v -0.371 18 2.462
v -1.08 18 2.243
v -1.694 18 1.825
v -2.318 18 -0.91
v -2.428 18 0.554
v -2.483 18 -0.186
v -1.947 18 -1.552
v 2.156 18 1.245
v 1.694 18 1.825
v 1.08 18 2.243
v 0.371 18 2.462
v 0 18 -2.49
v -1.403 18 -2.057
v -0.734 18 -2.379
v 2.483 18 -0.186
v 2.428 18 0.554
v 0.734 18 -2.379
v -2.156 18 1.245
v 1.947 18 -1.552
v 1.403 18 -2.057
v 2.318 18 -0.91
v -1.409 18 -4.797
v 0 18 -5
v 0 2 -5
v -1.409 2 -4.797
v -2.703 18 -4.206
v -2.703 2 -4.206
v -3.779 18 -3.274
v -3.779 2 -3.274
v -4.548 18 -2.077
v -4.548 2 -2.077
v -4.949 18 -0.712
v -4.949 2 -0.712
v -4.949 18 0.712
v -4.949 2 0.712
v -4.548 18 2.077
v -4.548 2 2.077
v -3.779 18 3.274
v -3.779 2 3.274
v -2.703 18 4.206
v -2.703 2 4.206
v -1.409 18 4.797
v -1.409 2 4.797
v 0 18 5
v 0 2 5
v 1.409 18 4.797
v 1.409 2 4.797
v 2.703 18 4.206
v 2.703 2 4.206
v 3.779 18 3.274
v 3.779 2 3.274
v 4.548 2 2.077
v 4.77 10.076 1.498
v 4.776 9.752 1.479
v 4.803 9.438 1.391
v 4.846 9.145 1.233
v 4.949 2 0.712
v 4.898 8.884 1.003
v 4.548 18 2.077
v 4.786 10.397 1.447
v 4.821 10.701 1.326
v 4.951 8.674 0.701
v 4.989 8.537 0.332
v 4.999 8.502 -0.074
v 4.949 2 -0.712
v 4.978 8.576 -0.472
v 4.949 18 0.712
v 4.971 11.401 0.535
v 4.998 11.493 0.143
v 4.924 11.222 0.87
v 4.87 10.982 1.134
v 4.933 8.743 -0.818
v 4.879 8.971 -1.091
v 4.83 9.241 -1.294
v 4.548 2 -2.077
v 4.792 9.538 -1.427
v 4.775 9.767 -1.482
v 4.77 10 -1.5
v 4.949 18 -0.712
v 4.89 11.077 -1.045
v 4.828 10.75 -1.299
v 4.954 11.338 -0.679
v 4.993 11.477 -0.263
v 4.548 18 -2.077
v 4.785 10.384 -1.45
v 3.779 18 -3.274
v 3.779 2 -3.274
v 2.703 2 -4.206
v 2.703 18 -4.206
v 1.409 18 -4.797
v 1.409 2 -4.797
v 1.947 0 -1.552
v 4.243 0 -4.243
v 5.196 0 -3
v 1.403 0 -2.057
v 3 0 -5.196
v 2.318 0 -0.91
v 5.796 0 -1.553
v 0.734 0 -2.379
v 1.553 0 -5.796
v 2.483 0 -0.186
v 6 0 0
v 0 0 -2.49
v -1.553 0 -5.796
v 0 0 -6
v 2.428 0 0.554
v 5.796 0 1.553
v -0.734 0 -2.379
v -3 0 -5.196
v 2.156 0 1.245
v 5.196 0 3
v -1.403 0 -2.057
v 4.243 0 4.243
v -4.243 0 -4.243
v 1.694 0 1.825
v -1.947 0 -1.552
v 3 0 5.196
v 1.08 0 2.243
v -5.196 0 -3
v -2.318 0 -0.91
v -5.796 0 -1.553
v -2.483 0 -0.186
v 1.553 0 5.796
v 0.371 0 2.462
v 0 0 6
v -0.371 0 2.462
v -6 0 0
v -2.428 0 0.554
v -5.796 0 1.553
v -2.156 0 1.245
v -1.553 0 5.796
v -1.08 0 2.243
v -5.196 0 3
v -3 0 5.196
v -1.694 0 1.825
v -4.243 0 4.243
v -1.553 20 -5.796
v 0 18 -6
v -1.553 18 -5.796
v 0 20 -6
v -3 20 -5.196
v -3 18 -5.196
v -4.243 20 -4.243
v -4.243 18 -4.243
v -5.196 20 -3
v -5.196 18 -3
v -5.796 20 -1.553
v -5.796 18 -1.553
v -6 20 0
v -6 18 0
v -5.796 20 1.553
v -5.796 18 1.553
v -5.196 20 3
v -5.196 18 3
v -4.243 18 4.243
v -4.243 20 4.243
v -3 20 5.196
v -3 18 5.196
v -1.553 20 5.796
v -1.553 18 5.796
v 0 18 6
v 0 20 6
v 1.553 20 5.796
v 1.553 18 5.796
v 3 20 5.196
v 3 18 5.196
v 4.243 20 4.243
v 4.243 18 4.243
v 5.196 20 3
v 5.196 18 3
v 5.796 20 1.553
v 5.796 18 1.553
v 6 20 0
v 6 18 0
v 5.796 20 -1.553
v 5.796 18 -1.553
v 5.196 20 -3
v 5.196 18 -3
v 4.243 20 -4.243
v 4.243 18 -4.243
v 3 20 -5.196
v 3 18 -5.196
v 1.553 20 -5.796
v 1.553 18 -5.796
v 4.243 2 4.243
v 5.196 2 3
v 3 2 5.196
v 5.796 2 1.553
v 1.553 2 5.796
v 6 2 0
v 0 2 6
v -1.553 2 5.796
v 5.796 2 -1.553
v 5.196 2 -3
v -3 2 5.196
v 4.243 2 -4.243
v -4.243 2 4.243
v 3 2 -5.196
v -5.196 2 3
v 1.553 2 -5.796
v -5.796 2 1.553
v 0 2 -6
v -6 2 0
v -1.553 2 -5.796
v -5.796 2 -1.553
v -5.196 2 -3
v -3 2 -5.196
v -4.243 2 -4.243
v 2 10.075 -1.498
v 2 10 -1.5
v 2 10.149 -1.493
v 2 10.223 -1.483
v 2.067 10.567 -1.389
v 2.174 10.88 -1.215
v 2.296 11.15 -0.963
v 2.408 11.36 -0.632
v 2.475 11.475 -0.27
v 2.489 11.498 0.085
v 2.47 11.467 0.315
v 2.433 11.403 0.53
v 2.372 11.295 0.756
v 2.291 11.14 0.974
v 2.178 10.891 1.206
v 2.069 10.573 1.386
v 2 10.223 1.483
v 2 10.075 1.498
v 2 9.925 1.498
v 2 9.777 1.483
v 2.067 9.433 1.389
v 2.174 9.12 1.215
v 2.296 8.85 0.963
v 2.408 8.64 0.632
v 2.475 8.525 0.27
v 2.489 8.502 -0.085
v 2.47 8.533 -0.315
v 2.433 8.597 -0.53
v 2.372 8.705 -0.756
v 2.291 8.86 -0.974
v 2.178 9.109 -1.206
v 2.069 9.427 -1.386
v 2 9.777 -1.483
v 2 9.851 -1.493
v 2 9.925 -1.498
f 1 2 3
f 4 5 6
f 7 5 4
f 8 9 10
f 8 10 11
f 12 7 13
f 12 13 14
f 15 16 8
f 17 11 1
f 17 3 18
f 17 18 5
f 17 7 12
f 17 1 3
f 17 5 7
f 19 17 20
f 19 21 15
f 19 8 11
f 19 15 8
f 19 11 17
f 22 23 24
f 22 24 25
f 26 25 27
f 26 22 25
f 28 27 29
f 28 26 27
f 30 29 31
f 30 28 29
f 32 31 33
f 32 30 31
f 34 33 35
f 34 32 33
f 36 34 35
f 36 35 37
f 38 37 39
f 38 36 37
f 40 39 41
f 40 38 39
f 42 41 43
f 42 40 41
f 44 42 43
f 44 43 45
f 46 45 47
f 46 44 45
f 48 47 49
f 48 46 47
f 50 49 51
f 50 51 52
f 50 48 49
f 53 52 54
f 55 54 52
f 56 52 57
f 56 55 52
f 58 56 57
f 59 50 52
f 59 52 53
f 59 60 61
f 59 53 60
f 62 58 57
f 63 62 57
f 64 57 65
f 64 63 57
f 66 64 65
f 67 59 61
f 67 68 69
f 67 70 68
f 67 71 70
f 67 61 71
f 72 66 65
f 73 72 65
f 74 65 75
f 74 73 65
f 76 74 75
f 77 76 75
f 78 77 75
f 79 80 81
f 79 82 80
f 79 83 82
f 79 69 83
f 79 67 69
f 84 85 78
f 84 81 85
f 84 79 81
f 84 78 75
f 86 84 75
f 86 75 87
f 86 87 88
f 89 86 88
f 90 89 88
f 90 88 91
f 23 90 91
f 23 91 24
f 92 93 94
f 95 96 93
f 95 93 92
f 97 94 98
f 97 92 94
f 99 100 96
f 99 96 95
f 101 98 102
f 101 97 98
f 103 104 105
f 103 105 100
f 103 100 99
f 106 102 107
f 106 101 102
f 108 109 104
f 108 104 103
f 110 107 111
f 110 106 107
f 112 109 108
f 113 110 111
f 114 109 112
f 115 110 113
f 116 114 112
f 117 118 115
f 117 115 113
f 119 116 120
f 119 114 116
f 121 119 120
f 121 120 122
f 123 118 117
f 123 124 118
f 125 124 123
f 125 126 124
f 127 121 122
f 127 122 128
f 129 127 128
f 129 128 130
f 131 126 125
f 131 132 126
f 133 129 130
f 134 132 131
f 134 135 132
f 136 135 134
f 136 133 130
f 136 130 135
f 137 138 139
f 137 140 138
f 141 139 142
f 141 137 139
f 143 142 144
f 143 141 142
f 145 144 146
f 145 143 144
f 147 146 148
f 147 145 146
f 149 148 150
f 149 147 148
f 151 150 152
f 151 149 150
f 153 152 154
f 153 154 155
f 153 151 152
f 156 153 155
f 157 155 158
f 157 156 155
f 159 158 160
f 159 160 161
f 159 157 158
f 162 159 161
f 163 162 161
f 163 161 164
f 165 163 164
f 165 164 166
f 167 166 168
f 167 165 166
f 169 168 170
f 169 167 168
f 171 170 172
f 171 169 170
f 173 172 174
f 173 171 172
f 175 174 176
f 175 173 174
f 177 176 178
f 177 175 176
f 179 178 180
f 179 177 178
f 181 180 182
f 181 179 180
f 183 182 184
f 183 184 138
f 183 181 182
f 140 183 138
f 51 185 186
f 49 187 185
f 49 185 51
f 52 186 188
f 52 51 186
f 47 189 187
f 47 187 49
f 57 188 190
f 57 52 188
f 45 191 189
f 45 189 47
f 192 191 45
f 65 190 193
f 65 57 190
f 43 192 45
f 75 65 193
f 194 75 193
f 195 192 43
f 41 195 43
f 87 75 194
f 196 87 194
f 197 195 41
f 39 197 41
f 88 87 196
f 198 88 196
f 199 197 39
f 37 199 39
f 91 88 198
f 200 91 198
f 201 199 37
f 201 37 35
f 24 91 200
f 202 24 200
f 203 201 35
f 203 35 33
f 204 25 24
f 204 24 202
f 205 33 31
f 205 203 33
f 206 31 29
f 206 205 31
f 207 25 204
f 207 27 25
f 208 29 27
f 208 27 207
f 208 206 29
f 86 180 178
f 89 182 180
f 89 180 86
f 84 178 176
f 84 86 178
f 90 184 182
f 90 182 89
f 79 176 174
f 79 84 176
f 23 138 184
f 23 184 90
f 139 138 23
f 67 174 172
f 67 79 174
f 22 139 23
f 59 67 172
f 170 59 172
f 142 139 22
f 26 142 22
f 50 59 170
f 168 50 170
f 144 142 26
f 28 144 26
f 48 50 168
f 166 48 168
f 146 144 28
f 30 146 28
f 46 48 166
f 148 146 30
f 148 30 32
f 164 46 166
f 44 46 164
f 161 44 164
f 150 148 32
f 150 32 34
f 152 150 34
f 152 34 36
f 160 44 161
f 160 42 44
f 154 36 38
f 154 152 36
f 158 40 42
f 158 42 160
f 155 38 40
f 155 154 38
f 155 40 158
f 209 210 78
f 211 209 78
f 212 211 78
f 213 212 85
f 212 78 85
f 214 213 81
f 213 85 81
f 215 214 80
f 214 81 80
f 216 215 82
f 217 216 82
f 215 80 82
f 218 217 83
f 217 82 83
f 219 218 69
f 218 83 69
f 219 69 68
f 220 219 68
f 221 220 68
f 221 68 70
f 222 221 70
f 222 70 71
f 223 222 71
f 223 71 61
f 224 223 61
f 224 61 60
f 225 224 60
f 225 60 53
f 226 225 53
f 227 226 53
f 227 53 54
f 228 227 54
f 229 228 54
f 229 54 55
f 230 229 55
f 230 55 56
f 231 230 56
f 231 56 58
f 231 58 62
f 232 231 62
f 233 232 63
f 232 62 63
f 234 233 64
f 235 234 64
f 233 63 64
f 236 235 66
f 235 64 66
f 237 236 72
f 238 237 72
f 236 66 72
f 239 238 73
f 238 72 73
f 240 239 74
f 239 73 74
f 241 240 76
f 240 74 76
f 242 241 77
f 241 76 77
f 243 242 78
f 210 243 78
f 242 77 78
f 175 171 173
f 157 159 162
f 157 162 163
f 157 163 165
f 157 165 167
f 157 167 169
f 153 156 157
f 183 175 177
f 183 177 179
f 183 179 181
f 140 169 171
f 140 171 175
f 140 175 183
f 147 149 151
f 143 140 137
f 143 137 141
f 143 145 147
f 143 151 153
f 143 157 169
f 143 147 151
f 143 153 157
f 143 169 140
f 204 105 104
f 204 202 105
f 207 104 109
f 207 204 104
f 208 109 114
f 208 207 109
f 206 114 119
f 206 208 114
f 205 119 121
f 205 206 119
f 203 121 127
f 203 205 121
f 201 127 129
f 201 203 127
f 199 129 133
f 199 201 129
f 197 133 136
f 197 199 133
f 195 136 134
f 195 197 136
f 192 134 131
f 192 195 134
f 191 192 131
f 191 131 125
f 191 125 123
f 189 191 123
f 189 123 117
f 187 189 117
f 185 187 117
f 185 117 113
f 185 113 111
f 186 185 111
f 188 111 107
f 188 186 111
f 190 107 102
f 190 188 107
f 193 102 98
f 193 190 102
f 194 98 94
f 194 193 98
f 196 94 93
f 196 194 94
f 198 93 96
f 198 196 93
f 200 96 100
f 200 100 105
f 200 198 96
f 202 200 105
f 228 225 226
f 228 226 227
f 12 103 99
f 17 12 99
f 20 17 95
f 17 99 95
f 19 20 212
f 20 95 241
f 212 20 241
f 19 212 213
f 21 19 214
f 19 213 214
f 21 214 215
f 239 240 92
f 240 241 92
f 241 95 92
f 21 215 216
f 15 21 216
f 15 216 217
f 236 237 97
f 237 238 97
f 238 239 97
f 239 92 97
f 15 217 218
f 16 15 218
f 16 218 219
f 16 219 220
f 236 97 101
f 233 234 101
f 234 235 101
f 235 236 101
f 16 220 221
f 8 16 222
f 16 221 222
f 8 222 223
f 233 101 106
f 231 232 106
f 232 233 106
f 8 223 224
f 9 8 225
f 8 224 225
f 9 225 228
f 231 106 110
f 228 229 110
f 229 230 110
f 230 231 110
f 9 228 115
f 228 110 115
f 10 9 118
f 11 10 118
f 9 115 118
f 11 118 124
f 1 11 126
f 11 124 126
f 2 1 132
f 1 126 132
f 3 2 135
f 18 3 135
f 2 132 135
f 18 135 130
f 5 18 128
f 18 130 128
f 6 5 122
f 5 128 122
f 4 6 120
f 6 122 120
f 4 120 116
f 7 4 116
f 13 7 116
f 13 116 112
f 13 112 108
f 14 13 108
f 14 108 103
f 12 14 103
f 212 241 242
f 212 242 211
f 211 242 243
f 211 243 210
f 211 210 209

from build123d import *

# Parameters (mm, degrees)
CROQUIS3_R            = 2.49
CORTAR_EXTRUIR1_DEPTH = 18
CROQUIS4_R            = 1.5
CORTAR_EXTRUIR2_DEPTH = 3


with BuildPart() as part:
    # Croquis2 → Revolución1 (revolve)
    with BuildSketch(Plane.XY, mode=Mode.PRIVATE) as revoluci_n1_sk:
        Polygon((0, 0), (-6, 0), (-6, 2), (-5, 2), (-5, 18), (-6, 18), (-6, 20), (0, 20), align=None)
    revolve(revoluci_n1_sk.sketch.rotate(Axis((0, 0, 0), (0, 1, 0)), 270), axis=Axis((0, 0, 0), (0, 1, 0)))

    # Croquis3 → Cortar-Extruir1 (cut)
    with BuildSketch(Plane.XZ):
        with Locations(Location((0, 0, 0), (0, 0, 270))):
            Circle(CROQUIS3_R)
    extrude(amount=-CORTAR_EXTRUIR1_DEPTH, mode=Mode.SUBTRACT)

    # Croquis4 → Cortar-Extruir2 (cut)
    with BuildSketch(Plane(origin=(5, 0, 0), x_dir=(0, 0, -1), z_dir=(1, 0, 0))):
        with Locations((0, 10)):
            Circle(CROQUIS4_R)
    extrude(amount=-CORTAR_EXTRUIR2_DEPTH, mode=Mode.SUBTRACT)


solid = part.part
